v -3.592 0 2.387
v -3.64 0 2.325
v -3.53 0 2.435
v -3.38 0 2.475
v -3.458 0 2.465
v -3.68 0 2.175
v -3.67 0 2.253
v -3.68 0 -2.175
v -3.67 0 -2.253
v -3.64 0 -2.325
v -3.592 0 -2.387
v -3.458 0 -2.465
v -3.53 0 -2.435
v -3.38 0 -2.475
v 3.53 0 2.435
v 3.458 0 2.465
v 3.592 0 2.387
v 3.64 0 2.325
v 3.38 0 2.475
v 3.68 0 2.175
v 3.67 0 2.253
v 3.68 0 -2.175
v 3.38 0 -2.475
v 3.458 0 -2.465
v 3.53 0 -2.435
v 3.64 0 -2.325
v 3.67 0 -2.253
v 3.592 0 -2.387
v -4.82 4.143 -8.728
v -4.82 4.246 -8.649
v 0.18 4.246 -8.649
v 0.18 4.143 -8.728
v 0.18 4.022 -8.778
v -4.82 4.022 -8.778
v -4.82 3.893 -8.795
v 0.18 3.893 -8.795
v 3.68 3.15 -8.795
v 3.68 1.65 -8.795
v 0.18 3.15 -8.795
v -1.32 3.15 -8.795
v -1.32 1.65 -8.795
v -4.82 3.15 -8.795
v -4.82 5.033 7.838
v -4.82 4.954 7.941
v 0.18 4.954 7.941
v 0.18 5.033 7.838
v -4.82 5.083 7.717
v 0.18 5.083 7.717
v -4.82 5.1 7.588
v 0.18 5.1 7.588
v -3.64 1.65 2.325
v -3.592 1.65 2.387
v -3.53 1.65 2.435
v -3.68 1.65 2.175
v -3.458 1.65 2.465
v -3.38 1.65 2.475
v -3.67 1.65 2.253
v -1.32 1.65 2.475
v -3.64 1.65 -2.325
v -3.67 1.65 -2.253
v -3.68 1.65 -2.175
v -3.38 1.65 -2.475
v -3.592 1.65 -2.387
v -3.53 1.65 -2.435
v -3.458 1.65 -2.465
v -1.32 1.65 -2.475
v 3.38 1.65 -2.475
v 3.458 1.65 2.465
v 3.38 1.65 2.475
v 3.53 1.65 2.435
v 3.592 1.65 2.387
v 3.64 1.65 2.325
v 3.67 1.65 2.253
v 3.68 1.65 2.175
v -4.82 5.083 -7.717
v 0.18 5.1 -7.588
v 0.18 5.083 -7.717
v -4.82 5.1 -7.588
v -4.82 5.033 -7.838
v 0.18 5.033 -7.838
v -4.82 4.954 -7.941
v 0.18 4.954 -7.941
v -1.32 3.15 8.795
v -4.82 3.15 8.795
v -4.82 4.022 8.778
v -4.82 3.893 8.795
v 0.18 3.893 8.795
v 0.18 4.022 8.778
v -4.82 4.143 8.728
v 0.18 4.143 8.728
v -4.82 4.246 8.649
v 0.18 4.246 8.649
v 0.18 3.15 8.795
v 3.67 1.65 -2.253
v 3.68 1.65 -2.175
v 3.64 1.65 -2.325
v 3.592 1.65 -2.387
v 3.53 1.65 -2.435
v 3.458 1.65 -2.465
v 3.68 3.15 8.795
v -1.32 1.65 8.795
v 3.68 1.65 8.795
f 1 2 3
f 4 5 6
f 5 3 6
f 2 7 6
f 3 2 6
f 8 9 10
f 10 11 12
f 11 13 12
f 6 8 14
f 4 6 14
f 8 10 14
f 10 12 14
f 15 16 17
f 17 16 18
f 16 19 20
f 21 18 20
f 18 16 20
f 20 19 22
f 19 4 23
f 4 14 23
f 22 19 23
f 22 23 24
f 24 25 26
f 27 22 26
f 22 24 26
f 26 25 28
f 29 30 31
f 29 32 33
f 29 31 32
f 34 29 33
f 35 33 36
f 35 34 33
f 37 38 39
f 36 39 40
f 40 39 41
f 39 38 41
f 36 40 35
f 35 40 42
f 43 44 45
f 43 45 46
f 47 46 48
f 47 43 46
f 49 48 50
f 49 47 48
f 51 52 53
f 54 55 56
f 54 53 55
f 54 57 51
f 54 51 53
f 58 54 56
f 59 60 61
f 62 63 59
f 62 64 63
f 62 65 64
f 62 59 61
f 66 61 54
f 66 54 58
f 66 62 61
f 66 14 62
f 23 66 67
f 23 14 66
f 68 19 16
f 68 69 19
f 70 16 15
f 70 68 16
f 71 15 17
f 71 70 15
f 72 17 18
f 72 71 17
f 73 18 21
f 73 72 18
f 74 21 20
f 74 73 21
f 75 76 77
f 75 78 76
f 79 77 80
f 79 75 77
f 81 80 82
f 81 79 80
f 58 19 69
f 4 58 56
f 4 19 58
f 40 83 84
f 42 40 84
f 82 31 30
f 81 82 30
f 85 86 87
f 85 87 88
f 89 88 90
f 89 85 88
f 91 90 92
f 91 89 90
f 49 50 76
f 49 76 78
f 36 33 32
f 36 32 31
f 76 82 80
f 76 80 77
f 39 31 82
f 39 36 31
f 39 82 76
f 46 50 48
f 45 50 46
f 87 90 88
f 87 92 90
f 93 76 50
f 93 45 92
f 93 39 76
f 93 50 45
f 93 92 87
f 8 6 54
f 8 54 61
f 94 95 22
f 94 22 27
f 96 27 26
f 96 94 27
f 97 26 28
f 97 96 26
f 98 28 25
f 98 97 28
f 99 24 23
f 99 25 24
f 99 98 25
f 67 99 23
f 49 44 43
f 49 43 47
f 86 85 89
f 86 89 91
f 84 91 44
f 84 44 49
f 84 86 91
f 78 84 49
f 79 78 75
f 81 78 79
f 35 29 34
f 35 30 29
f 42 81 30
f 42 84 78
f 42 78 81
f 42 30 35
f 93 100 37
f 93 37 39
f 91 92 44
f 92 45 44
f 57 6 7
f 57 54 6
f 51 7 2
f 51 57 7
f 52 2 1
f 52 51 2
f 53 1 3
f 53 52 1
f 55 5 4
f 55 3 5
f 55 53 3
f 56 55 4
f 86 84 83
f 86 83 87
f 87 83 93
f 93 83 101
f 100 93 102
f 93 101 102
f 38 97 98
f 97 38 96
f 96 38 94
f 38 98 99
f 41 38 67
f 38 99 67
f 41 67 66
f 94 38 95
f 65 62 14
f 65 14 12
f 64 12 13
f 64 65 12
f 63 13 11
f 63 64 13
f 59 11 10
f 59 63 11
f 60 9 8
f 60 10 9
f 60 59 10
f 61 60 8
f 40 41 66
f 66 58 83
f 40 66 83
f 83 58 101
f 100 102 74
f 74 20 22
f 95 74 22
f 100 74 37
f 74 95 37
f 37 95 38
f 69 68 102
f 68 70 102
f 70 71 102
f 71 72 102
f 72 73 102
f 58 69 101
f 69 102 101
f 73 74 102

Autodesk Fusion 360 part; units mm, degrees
sketch "Sketch1" plane through (0, 0, 0) normal (0, 1, 0) x (1, 0, 0)
  line L0 (3.68, -2.475) -> (-3.68, -2.475)
  line L1 (-3.68, -2.475) -> (-3.68, 2.475)
  line L2 (-3.68, 2.475) -> (3.68, 2.475)
  line L3 (3.68, 2.475) -> (3.68, -2.475)
  line L4 (3.68, -2.475) -> (-3.68, 2.475) construction
  line L5 (-3.68, -2.475) -> (3.68, 2.475) construction
  dimension "d124" = 7.36
  dimension "d125" = 4.95
extrude "Extrude1" add sketch "Sketch1" along normal blind 1.65 makes body 1
fillet "Fillet1" radius 0.3 4 edges at (-3.68, 0.825, 2.475) (3.68, 0.825, 2.475) (3.68, 0.825, -2.475) (-3.68, 0.825, -2.475) on bodies 1
sketch "Sketch2" plane through (0, 1.65, 0) normal (0, 1, 0) x (-1, 0, 0)
  line L0 (1.32, 8.795) -> (-3.68, 8.795)
  line L1 (-3.68, 8.795) -> (-3.68, -8.795)
  line L2 (-3.68, -8.795) -> (1.32, -8.795)
  line L3 (1.32, -8.795) -> (1.32, 8.795)
  line L4 (-3.68, 2.175) -> (-3.68, -2.175)
  line L5 (0, 0) -> (-3.68, 0) construction
  dimension "d136" = 17.59
  dimension "d137" = 5
extrude "Extrude5" add sketch "Sketch2" along normal blind 1.5 bodies 1
sketch "Sketch6" plane through (0, 3.15, 0) normal (0, 1, 0) x (-1, 0, 0)
  line L0 (-3.68, 8.795) -> (-3.68, -8.795)
  line L1 (-3.68, -8.795) -> (1.32, -8.795)
  line L2 (1.32, -8.795) -> (1.32, 8.795)
  line L3 (1.32, 8.795) -> (-3.68, 8.795)
  line L4 (-0.18, 8.795) -> (4.82, 8.795)
  line L5 (4.82, 8.795) -> (4.82, -8.795)
  line L6 (4.82, -8.795) -> (-0.18, -8.795)
  line L7 (-0.18, -8.795) -> (-0.18, 8.795)
  dimension "d158" = 3.5
extrude "Extrude7" add sketch "Sketch6" along normal blind 1.95 separate body contours L1 L2 L3 L4 L6 L7 | L2 L4 L5 L6 makes body 2
chamfer "Chamfer2" distance 1 angle 45 2 edges at (-2.32, 5.1, 8.795) (-2.32, 5.1, -8.795) on bodies 2
fillet "Fillet3" radius 0.5 4 edges at (-2.32, 5.1, 7.795) (-2.32, 4.1, 8.795) (-2.32, 5.1, -7.795) (-2.32, 4.1, -8.795) on bodies 2
combine "Combine1" operation add target body 2 tool bodies 1
sketch "Sketch7" plane through (0, 0, 0) normal (0, -1, 0) x (1, 0, 0)
  arc A0 (-3.68, -2.175) -> (-3.38, -2.475) centre (-3.38, -2.175) ccw
  line L0 (-3.38, -2.475) -> (3.38, -2.475)
  arc A1 (3.38, -2.475) -> (3.68, -2.175) centre (3.38, -2.175) ccw
  line L1 (3.68, -2.175) -> (3.68, 2.175)
  arc A2 (3.68, 2.175) -> (3.38, 2.475) centre (3.38, 2.175) ccw
  line L2 (3.38, 2.475) -> (-3.38, 2.475)
  arc A3 (-3.38, 2.475) -> (-3.68, 2.175) centre (-3.38, 2.175) ccw
  line L3 (-3.68, 2.175) -> (-3.68, -2.175)
extrude "Extrude8" [suppressed]
equation "d131 = DetentBottomPieceFilletRadius"
equation "d158 = DetentShiftDistance"
equation "DetentBottomPieceFilletRadius = 0.3 mm"
equation "DetentShiftDistance = 3.5 mm"
